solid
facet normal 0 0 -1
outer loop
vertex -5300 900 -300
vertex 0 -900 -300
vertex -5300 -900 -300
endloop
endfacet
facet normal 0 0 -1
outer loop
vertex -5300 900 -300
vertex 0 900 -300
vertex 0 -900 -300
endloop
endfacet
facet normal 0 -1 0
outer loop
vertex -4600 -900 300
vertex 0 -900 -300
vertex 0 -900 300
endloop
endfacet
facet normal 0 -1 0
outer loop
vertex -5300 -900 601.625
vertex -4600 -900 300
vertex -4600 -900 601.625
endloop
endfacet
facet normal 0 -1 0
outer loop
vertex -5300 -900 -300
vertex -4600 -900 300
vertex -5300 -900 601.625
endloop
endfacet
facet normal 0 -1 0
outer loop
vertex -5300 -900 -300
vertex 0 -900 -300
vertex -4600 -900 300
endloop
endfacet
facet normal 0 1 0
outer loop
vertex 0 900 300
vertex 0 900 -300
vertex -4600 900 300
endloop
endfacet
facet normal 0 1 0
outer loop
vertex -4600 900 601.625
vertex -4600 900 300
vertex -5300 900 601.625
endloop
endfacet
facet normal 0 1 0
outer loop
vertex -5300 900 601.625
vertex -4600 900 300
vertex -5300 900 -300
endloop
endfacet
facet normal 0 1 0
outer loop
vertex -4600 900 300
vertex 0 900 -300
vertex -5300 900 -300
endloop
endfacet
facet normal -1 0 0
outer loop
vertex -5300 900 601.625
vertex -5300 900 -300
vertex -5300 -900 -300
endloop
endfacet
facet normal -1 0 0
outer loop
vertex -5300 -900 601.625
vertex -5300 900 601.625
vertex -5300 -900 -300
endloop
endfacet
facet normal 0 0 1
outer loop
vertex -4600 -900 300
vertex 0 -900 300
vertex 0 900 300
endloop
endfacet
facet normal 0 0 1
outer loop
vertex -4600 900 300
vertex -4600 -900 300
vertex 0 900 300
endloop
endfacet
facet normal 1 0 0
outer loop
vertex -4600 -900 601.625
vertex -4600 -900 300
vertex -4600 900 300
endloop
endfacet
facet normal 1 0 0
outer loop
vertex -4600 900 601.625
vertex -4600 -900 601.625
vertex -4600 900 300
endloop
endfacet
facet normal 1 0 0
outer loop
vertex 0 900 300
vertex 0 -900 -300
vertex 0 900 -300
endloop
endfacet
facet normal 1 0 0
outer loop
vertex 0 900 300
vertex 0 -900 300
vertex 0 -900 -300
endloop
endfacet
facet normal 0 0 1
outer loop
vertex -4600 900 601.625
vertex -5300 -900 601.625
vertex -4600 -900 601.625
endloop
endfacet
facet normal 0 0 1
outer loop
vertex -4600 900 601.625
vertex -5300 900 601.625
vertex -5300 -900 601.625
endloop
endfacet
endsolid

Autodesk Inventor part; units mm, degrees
ref_plane "YZ Plane" through (0, 0, 0) normal (1, 0, 0) x (0, 1, 0)
ref_plane "XZ Plane" through (0, 0, 0) normal (0, 1, 0) x (-1, 0, 0)
ref_plane "XY Plane" through (0, 0, 0) normal (0, 0, 1) x (1, 0, 0)
sketch "Sketch1" plane through (0, 0, 0) normal (1, 0, 0) x (0, 1, 0)
  line L0 (-900, 300) -> (900, 300)
  line L1 (900, 300) -> (900, -300)
  line L2 (900, -300) -> (-900, -300)
  line L3 (-900, -300) -> (-900, 300)
  line L4 (-900, 300) -> (900, -300) construction
  line L5 (900, 300) -> (-900, -300) construction
  point P0 (0, 0)
  dimension "d0" = 1800
  dimension "d1" = 600
extrude "Extrusion1" add sketch "Sketch1" against normal blind 5300
sketch "Sketch2" plane through (0, -900, -300) normal (0, 0, -1) x (-1, 0, 0)
  line L0 (0, 1800) -> (5300, 1800) projected
  line L1 (5300, 1800) -> (4600, 1800)
  line L2 (4600, 1800) -> (4600, 0)
  line L3 (4600, 0) -> (5300, 0)
  line L4 (5300, 0) -> (5300, 1800)
  point P0 (0, 900)
  dimension "d4" = 700
extrude "Extrusion2" add sketch "Sketch2" along normal blind 301.625
sketch "Sketch3" plane through (0, -900, -601.625) normal (0, 0, -1) x (-1, 0, 0)
  line L0 (5300, 1800) -> (4600, 1800) projected
  line L1 (4600, 1800) -> (4600, 0) projected
  line L2 (4600, 0) -> (5300, 0) projected
  line L3 (5300, 0) -> (5300, 1800) projected
  point P0 (0, 900)
extrude "Extrusion3" cut sketch "Sketch3" against normal up to surface (301.625 mm away)
sketch "Sketch4" plane through (0, -900, 300) normal (0, 0, 1) x (1, 0, 0)
  line L0 (0, 0) -> (-5300, 0) projected
  line L1 (-5300, 0) -> (-4600, 0)
  line L2 (-4600, 0) -> (-4600, 1800)
  line L3 (-4600, 1800) -> (-5300, 1800)
  line L4 (-5300, 1800) -> (-5300, 0)
  point P0 (0, 900)
  point P1 (-4600, 0)
  dimension "d9" = 700
  dimension "d10" = 1800
extrude "Extrusion4" add sketch "Sketch4" along normal blind 301.625
sketch "Sketch6" plane through (-5300, 0, 0) normal (-1, 0, 0) x (0, 0, 1)
  line L0 (-300, -900) -> (-300, 900) construction
  line L1 (-300, 900) -> (0, 900) construction
  line L2 (300, 900) -> (300, -900) construction
  line L3 (-300, 900) -> (0, 900) construction
  line L4 (0, 900) -> (0, 1301.6) construction
  point P0 (0, 0)
  dimension "d14" = 300
  dimension "d15" = 0
  dimension "d16" = 401.6
  dimension "d17" = 90
equation "\"d0\" = serv_h"
equation "\"d1\" = serv_w"
equation "\"d2\" = serv_e"
equation "\"d14\" = 0.5 * serv_w"
equation "\"d16\" = tray_h + leg_e"
equation "\"serv_h\" = 1800"
equation "\"serv_w\" = 600"
equation "\"serv_e\" = 5300"
equation "\"tray_h\" = 101.6"
equation "\"leg_e\" = 300"
properties part number "ServerCabinetRight"
